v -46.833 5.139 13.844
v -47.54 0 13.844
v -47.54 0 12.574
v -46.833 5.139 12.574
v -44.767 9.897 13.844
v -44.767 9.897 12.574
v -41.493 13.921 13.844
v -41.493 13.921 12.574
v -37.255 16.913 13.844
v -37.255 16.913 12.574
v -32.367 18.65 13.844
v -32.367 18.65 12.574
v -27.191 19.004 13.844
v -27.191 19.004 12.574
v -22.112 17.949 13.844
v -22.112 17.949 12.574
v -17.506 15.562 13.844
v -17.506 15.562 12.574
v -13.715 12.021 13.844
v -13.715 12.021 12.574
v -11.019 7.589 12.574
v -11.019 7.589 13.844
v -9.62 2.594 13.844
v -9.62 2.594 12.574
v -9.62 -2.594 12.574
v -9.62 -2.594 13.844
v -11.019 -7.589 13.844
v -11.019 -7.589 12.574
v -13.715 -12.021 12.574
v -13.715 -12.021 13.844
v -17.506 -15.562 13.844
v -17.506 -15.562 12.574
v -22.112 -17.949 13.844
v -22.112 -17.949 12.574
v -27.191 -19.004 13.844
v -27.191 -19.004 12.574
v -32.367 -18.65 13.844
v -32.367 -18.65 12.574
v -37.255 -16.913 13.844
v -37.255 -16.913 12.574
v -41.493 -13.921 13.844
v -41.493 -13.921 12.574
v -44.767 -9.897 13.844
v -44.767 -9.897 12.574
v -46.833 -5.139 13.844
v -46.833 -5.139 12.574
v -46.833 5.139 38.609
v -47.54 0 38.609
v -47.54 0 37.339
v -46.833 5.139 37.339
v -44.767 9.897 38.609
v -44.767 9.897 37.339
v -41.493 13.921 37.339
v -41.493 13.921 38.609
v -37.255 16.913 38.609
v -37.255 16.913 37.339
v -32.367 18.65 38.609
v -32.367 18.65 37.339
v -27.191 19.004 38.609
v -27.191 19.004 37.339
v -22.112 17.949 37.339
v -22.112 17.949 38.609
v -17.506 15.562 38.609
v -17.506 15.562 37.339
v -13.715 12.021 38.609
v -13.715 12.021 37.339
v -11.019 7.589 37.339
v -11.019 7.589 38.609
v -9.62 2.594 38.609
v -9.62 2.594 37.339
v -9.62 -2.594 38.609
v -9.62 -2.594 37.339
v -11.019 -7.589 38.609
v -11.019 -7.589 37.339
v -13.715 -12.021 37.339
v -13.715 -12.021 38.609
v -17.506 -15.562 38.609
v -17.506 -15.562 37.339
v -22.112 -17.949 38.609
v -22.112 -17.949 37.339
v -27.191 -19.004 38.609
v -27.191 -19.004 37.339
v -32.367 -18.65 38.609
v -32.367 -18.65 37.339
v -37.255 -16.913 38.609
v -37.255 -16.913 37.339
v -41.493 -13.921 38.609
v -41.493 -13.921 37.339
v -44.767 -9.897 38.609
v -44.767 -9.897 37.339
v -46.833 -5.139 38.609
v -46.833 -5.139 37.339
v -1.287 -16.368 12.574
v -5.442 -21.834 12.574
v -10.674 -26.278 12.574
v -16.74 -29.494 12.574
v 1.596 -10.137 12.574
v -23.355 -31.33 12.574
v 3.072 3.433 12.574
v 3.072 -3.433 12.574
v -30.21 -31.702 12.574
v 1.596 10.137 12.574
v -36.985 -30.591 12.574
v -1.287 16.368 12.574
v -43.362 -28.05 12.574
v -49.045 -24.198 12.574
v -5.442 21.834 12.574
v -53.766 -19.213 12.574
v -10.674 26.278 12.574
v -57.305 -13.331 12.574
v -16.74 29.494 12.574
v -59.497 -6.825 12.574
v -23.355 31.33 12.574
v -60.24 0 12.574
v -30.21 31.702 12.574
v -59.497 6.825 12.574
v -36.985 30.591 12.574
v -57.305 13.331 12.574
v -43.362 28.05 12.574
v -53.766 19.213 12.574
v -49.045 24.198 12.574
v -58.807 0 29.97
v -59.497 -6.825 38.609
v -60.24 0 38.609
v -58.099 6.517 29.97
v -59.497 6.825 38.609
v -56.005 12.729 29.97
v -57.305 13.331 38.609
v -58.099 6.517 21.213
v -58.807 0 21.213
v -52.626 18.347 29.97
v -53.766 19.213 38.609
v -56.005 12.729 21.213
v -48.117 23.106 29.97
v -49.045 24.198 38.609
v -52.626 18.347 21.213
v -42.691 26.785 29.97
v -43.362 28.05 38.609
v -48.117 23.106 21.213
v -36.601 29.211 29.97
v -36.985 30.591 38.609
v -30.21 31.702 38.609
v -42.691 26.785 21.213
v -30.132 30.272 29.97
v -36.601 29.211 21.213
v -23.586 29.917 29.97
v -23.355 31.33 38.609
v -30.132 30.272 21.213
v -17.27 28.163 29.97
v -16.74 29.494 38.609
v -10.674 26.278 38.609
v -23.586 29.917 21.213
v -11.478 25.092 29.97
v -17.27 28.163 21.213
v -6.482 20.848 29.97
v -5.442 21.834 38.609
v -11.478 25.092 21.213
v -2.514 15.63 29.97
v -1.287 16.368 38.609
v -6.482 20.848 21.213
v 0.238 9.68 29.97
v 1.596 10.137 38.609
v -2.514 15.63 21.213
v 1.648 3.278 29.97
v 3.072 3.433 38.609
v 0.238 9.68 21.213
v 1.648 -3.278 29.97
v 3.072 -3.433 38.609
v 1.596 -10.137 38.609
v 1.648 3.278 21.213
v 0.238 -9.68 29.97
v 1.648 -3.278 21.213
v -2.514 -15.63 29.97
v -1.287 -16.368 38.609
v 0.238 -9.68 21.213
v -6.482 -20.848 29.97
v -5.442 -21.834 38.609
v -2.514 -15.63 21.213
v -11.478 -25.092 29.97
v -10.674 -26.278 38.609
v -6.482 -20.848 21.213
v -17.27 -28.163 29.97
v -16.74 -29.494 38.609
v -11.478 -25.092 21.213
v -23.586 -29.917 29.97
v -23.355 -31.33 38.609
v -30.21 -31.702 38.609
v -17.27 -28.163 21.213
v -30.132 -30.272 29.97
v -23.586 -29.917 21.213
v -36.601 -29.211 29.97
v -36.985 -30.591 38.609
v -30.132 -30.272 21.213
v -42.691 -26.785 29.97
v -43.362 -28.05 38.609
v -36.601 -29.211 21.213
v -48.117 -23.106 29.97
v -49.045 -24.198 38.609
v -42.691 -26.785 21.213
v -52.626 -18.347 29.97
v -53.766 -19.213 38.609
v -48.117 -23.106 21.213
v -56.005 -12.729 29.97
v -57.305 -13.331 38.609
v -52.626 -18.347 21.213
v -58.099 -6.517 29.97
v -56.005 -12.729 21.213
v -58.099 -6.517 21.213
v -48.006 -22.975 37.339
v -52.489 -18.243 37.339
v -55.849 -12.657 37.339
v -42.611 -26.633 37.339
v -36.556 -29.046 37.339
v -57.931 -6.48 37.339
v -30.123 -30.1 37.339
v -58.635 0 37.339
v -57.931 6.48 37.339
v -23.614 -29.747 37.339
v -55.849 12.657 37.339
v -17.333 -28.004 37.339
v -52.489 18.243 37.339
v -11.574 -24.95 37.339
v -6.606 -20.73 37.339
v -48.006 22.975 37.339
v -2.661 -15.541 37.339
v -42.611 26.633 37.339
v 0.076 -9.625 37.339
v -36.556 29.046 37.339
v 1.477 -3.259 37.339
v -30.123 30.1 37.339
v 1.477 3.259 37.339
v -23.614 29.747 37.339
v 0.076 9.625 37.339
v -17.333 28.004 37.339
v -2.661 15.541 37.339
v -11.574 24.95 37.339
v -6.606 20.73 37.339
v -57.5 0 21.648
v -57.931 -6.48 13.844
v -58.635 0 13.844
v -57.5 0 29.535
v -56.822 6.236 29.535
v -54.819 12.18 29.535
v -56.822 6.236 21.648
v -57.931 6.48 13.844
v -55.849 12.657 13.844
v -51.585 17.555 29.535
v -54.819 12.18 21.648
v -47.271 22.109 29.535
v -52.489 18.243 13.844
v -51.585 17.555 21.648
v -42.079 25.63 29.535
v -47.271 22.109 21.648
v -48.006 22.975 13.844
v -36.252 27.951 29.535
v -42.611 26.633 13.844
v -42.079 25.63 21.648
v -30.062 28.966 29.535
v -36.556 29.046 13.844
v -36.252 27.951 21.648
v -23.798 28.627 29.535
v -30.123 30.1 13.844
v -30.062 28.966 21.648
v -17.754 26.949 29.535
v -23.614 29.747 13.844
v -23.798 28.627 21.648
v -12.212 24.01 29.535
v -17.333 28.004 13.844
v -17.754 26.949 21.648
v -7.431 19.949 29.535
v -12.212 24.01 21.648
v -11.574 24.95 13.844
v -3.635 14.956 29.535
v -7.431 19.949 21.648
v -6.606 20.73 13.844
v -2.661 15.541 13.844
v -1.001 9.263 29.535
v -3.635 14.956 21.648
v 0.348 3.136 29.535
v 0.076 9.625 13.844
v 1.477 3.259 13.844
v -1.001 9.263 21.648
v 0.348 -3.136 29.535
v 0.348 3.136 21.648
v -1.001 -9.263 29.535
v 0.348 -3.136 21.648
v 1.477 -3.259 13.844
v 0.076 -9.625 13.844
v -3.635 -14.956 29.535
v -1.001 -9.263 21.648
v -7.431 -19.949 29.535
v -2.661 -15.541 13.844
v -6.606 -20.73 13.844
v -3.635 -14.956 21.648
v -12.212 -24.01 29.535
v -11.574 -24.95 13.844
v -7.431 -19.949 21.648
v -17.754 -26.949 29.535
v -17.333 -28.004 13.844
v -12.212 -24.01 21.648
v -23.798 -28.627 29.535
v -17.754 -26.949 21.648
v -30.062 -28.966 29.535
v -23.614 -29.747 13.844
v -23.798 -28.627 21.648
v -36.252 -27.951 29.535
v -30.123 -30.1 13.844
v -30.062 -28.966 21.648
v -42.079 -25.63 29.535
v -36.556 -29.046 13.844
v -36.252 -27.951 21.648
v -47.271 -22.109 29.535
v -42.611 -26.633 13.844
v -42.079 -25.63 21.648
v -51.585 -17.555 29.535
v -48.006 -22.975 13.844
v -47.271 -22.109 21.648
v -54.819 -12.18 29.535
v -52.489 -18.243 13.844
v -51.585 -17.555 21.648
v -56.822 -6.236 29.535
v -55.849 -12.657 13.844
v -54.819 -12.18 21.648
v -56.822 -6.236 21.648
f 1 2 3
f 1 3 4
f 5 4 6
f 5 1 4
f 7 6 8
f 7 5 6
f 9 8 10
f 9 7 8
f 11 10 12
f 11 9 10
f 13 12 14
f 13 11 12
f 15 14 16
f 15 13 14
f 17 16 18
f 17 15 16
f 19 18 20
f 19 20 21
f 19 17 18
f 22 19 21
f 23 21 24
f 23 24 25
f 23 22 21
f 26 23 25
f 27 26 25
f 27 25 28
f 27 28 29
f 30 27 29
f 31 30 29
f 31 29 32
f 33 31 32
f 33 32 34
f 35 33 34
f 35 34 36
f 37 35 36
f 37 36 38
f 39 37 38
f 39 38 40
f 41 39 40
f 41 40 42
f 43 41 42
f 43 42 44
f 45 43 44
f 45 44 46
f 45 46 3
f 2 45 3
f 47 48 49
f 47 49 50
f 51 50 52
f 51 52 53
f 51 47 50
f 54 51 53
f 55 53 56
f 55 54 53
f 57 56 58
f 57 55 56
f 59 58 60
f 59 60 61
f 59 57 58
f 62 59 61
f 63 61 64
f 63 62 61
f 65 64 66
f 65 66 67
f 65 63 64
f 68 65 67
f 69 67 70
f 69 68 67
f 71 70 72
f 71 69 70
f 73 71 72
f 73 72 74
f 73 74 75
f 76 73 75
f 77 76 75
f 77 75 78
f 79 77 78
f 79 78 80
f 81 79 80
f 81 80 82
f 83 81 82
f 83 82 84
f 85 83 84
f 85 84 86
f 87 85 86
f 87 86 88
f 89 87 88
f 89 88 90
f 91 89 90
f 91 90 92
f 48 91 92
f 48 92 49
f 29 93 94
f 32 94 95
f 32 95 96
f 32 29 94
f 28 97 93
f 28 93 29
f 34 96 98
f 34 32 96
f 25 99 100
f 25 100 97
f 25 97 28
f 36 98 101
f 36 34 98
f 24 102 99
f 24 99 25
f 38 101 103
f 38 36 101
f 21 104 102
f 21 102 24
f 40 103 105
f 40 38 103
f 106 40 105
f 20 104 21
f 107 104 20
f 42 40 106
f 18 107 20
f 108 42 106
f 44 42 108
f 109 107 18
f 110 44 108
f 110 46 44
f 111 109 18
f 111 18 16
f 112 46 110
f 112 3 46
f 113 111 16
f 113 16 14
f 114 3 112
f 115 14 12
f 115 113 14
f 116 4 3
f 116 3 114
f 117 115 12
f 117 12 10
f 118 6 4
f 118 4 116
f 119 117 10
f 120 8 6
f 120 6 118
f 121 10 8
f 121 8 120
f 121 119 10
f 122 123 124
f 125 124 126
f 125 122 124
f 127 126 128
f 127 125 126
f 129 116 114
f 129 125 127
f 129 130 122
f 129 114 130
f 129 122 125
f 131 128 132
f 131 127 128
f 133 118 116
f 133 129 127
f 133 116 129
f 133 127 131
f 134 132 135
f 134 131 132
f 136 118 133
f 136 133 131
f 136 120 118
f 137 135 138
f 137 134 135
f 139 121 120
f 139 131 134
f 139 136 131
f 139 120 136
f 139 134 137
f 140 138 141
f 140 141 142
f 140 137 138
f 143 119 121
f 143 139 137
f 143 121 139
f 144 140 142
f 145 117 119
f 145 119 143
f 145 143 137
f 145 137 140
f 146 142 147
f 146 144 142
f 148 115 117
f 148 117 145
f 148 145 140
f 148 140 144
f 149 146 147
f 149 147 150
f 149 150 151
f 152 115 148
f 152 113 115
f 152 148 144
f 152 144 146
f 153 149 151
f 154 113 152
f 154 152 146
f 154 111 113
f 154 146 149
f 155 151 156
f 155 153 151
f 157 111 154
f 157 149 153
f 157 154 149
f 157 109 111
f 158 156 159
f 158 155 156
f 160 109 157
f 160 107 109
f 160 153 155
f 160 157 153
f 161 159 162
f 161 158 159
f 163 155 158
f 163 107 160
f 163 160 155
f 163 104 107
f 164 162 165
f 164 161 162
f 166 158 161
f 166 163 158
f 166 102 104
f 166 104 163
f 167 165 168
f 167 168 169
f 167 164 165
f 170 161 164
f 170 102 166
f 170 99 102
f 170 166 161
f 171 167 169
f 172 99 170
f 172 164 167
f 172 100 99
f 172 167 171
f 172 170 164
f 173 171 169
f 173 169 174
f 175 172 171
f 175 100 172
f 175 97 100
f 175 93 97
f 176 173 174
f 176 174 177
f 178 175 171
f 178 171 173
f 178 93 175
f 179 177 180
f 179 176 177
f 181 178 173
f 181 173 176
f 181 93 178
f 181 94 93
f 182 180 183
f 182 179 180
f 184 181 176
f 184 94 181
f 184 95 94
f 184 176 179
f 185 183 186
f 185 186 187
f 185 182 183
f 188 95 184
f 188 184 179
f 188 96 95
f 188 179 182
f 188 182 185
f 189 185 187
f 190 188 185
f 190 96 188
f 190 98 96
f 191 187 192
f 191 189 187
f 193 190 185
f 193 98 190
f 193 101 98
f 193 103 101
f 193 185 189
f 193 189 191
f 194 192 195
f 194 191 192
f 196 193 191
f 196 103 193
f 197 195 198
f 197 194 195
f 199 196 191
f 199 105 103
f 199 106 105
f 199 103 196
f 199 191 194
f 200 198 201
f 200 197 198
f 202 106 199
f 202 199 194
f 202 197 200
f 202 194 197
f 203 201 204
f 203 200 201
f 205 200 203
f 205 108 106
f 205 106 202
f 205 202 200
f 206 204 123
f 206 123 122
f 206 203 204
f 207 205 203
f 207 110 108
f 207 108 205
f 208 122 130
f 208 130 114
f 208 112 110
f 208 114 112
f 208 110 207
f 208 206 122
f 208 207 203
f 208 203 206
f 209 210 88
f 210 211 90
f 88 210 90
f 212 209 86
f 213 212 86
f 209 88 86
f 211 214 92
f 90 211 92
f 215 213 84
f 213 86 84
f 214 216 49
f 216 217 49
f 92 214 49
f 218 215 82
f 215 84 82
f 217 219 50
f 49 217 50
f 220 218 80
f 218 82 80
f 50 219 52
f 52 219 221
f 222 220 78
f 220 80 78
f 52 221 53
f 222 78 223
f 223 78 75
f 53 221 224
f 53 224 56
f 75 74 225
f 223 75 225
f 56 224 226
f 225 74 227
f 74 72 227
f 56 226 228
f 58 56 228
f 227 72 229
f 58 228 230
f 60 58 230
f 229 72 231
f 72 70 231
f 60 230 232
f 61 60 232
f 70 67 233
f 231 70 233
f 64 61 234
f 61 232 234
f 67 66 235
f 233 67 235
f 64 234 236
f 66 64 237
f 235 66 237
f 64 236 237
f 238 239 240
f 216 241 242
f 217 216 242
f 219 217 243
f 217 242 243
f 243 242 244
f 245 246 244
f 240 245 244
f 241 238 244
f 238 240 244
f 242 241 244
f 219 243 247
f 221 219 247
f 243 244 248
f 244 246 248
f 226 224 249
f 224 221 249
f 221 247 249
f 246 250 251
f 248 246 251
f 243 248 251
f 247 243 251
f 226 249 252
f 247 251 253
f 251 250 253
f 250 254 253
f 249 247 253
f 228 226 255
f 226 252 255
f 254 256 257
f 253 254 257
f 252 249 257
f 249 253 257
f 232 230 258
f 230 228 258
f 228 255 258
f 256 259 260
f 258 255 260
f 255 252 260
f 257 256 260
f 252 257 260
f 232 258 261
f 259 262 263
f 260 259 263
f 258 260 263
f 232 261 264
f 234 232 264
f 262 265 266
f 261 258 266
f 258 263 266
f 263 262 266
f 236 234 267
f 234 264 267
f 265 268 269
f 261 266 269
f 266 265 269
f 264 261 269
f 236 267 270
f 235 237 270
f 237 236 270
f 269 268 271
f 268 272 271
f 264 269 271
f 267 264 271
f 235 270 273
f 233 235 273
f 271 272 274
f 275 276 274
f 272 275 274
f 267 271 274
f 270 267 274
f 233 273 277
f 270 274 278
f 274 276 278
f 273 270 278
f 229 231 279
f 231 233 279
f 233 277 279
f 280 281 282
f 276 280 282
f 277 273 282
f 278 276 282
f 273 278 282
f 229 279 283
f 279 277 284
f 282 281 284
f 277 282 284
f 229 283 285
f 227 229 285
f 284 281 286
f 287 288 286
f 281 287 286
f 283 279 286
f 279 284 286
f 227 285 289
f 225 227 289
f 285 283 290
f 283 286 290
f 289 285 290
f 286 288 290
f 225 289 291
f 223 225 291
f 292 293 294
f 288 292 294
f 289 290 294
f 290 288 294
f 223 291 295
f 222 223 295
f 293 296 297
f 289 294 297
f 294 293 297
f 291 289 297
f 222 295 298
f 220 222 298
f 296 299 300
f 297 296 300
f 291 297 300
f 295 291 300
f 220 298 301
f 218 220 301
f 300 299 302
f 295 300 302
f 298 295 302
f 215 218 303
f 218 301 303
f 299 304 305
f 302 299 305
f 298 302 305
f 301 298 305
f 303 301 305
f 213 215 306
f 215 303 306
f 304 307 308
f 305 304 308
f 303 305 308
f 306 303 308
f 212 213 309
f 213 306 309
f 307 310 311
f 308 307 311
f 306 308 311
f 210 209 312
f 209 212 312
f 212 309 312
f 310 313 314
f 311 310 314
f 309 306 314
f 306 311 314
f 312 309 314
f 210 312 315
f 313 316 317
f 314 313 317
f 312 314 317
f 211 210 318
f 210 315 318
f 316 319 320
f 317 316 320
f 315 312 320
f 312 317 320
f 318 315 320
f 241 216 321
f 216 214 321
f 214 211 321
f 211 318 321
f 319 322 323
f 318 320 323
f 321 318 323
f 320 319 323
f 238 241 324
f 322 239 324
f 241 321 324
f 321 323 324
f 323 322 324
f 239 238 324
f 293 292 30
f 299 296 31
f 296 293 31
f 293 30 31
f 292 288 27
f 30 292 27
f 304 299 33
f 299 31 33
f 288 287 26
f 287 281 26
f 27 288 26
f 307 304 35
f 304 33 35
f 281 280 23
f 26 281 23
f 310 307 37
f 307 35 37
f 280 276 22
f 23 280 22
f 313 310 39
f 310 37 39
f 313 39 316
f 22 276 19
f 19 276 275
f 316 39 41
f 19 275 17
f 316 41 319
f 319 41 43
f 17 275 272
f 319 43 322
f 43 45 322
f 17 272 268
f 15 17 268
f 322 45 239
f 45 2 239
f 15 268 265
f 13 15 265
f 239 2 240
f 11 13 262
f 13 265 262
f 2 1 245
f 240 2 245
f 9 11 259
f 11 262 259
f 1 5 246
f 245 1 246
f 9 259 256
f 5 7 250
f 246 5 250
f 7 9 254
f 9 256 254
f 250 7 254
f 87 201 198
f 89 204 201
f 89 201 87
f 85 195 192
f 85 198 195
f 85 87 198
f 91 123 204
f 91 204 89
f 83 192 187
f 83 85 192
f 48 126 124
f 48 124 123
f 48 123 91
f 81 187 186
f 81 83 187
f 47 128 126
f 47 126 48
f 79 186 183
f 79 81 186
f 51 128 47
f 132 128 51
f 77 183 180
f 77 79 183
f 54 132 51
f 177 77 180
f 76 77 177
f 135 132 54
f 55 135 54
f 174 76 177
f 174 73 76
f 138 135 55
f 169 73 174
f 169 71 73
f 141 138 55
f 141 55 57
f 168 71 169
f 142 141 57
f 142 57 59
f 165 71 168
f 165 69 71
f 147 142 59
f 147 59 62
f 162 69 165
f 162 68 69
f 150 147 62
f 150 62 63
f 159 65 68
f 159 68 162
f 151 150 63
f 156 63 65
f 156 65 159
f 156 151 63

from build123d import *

# Parameters (mm, degrees)
F2_T = -1.27


with BuildPart() as f1:
    # F0 (on Front) → F1 (revolve)
    with BuildSketch(Plane.XZ):
        with BuildLine():
            ThreePointArc((-60.2397024632, 38.6090278625), (-58.6273197833, 25.5915278625), (-60.2397024632, 12.5740278625))
            Line((-60.2397024632, 12.5740278625), (-47.5397024632, 12.5740278625))
            Line((-47.5397024632, 12.5740278625), (-47.5397024632, 38.6090278625))
            Line((-47.5397024632, 38.6090278625), (-60.2397024632, 38.6090278625))
        make_face()
    revolve(axis=Axis((-28.491001968, 0, 25.3042703682), (0, 0, -1)))

    # F2
    f2_openings = [f1.faces().sort_by_distance(p)[0] for p in [
        (-9.442301, 0, 25.591528),
    ]]
    offset(amount=F2_T, openings=f2_openings)


solid = f1.part
